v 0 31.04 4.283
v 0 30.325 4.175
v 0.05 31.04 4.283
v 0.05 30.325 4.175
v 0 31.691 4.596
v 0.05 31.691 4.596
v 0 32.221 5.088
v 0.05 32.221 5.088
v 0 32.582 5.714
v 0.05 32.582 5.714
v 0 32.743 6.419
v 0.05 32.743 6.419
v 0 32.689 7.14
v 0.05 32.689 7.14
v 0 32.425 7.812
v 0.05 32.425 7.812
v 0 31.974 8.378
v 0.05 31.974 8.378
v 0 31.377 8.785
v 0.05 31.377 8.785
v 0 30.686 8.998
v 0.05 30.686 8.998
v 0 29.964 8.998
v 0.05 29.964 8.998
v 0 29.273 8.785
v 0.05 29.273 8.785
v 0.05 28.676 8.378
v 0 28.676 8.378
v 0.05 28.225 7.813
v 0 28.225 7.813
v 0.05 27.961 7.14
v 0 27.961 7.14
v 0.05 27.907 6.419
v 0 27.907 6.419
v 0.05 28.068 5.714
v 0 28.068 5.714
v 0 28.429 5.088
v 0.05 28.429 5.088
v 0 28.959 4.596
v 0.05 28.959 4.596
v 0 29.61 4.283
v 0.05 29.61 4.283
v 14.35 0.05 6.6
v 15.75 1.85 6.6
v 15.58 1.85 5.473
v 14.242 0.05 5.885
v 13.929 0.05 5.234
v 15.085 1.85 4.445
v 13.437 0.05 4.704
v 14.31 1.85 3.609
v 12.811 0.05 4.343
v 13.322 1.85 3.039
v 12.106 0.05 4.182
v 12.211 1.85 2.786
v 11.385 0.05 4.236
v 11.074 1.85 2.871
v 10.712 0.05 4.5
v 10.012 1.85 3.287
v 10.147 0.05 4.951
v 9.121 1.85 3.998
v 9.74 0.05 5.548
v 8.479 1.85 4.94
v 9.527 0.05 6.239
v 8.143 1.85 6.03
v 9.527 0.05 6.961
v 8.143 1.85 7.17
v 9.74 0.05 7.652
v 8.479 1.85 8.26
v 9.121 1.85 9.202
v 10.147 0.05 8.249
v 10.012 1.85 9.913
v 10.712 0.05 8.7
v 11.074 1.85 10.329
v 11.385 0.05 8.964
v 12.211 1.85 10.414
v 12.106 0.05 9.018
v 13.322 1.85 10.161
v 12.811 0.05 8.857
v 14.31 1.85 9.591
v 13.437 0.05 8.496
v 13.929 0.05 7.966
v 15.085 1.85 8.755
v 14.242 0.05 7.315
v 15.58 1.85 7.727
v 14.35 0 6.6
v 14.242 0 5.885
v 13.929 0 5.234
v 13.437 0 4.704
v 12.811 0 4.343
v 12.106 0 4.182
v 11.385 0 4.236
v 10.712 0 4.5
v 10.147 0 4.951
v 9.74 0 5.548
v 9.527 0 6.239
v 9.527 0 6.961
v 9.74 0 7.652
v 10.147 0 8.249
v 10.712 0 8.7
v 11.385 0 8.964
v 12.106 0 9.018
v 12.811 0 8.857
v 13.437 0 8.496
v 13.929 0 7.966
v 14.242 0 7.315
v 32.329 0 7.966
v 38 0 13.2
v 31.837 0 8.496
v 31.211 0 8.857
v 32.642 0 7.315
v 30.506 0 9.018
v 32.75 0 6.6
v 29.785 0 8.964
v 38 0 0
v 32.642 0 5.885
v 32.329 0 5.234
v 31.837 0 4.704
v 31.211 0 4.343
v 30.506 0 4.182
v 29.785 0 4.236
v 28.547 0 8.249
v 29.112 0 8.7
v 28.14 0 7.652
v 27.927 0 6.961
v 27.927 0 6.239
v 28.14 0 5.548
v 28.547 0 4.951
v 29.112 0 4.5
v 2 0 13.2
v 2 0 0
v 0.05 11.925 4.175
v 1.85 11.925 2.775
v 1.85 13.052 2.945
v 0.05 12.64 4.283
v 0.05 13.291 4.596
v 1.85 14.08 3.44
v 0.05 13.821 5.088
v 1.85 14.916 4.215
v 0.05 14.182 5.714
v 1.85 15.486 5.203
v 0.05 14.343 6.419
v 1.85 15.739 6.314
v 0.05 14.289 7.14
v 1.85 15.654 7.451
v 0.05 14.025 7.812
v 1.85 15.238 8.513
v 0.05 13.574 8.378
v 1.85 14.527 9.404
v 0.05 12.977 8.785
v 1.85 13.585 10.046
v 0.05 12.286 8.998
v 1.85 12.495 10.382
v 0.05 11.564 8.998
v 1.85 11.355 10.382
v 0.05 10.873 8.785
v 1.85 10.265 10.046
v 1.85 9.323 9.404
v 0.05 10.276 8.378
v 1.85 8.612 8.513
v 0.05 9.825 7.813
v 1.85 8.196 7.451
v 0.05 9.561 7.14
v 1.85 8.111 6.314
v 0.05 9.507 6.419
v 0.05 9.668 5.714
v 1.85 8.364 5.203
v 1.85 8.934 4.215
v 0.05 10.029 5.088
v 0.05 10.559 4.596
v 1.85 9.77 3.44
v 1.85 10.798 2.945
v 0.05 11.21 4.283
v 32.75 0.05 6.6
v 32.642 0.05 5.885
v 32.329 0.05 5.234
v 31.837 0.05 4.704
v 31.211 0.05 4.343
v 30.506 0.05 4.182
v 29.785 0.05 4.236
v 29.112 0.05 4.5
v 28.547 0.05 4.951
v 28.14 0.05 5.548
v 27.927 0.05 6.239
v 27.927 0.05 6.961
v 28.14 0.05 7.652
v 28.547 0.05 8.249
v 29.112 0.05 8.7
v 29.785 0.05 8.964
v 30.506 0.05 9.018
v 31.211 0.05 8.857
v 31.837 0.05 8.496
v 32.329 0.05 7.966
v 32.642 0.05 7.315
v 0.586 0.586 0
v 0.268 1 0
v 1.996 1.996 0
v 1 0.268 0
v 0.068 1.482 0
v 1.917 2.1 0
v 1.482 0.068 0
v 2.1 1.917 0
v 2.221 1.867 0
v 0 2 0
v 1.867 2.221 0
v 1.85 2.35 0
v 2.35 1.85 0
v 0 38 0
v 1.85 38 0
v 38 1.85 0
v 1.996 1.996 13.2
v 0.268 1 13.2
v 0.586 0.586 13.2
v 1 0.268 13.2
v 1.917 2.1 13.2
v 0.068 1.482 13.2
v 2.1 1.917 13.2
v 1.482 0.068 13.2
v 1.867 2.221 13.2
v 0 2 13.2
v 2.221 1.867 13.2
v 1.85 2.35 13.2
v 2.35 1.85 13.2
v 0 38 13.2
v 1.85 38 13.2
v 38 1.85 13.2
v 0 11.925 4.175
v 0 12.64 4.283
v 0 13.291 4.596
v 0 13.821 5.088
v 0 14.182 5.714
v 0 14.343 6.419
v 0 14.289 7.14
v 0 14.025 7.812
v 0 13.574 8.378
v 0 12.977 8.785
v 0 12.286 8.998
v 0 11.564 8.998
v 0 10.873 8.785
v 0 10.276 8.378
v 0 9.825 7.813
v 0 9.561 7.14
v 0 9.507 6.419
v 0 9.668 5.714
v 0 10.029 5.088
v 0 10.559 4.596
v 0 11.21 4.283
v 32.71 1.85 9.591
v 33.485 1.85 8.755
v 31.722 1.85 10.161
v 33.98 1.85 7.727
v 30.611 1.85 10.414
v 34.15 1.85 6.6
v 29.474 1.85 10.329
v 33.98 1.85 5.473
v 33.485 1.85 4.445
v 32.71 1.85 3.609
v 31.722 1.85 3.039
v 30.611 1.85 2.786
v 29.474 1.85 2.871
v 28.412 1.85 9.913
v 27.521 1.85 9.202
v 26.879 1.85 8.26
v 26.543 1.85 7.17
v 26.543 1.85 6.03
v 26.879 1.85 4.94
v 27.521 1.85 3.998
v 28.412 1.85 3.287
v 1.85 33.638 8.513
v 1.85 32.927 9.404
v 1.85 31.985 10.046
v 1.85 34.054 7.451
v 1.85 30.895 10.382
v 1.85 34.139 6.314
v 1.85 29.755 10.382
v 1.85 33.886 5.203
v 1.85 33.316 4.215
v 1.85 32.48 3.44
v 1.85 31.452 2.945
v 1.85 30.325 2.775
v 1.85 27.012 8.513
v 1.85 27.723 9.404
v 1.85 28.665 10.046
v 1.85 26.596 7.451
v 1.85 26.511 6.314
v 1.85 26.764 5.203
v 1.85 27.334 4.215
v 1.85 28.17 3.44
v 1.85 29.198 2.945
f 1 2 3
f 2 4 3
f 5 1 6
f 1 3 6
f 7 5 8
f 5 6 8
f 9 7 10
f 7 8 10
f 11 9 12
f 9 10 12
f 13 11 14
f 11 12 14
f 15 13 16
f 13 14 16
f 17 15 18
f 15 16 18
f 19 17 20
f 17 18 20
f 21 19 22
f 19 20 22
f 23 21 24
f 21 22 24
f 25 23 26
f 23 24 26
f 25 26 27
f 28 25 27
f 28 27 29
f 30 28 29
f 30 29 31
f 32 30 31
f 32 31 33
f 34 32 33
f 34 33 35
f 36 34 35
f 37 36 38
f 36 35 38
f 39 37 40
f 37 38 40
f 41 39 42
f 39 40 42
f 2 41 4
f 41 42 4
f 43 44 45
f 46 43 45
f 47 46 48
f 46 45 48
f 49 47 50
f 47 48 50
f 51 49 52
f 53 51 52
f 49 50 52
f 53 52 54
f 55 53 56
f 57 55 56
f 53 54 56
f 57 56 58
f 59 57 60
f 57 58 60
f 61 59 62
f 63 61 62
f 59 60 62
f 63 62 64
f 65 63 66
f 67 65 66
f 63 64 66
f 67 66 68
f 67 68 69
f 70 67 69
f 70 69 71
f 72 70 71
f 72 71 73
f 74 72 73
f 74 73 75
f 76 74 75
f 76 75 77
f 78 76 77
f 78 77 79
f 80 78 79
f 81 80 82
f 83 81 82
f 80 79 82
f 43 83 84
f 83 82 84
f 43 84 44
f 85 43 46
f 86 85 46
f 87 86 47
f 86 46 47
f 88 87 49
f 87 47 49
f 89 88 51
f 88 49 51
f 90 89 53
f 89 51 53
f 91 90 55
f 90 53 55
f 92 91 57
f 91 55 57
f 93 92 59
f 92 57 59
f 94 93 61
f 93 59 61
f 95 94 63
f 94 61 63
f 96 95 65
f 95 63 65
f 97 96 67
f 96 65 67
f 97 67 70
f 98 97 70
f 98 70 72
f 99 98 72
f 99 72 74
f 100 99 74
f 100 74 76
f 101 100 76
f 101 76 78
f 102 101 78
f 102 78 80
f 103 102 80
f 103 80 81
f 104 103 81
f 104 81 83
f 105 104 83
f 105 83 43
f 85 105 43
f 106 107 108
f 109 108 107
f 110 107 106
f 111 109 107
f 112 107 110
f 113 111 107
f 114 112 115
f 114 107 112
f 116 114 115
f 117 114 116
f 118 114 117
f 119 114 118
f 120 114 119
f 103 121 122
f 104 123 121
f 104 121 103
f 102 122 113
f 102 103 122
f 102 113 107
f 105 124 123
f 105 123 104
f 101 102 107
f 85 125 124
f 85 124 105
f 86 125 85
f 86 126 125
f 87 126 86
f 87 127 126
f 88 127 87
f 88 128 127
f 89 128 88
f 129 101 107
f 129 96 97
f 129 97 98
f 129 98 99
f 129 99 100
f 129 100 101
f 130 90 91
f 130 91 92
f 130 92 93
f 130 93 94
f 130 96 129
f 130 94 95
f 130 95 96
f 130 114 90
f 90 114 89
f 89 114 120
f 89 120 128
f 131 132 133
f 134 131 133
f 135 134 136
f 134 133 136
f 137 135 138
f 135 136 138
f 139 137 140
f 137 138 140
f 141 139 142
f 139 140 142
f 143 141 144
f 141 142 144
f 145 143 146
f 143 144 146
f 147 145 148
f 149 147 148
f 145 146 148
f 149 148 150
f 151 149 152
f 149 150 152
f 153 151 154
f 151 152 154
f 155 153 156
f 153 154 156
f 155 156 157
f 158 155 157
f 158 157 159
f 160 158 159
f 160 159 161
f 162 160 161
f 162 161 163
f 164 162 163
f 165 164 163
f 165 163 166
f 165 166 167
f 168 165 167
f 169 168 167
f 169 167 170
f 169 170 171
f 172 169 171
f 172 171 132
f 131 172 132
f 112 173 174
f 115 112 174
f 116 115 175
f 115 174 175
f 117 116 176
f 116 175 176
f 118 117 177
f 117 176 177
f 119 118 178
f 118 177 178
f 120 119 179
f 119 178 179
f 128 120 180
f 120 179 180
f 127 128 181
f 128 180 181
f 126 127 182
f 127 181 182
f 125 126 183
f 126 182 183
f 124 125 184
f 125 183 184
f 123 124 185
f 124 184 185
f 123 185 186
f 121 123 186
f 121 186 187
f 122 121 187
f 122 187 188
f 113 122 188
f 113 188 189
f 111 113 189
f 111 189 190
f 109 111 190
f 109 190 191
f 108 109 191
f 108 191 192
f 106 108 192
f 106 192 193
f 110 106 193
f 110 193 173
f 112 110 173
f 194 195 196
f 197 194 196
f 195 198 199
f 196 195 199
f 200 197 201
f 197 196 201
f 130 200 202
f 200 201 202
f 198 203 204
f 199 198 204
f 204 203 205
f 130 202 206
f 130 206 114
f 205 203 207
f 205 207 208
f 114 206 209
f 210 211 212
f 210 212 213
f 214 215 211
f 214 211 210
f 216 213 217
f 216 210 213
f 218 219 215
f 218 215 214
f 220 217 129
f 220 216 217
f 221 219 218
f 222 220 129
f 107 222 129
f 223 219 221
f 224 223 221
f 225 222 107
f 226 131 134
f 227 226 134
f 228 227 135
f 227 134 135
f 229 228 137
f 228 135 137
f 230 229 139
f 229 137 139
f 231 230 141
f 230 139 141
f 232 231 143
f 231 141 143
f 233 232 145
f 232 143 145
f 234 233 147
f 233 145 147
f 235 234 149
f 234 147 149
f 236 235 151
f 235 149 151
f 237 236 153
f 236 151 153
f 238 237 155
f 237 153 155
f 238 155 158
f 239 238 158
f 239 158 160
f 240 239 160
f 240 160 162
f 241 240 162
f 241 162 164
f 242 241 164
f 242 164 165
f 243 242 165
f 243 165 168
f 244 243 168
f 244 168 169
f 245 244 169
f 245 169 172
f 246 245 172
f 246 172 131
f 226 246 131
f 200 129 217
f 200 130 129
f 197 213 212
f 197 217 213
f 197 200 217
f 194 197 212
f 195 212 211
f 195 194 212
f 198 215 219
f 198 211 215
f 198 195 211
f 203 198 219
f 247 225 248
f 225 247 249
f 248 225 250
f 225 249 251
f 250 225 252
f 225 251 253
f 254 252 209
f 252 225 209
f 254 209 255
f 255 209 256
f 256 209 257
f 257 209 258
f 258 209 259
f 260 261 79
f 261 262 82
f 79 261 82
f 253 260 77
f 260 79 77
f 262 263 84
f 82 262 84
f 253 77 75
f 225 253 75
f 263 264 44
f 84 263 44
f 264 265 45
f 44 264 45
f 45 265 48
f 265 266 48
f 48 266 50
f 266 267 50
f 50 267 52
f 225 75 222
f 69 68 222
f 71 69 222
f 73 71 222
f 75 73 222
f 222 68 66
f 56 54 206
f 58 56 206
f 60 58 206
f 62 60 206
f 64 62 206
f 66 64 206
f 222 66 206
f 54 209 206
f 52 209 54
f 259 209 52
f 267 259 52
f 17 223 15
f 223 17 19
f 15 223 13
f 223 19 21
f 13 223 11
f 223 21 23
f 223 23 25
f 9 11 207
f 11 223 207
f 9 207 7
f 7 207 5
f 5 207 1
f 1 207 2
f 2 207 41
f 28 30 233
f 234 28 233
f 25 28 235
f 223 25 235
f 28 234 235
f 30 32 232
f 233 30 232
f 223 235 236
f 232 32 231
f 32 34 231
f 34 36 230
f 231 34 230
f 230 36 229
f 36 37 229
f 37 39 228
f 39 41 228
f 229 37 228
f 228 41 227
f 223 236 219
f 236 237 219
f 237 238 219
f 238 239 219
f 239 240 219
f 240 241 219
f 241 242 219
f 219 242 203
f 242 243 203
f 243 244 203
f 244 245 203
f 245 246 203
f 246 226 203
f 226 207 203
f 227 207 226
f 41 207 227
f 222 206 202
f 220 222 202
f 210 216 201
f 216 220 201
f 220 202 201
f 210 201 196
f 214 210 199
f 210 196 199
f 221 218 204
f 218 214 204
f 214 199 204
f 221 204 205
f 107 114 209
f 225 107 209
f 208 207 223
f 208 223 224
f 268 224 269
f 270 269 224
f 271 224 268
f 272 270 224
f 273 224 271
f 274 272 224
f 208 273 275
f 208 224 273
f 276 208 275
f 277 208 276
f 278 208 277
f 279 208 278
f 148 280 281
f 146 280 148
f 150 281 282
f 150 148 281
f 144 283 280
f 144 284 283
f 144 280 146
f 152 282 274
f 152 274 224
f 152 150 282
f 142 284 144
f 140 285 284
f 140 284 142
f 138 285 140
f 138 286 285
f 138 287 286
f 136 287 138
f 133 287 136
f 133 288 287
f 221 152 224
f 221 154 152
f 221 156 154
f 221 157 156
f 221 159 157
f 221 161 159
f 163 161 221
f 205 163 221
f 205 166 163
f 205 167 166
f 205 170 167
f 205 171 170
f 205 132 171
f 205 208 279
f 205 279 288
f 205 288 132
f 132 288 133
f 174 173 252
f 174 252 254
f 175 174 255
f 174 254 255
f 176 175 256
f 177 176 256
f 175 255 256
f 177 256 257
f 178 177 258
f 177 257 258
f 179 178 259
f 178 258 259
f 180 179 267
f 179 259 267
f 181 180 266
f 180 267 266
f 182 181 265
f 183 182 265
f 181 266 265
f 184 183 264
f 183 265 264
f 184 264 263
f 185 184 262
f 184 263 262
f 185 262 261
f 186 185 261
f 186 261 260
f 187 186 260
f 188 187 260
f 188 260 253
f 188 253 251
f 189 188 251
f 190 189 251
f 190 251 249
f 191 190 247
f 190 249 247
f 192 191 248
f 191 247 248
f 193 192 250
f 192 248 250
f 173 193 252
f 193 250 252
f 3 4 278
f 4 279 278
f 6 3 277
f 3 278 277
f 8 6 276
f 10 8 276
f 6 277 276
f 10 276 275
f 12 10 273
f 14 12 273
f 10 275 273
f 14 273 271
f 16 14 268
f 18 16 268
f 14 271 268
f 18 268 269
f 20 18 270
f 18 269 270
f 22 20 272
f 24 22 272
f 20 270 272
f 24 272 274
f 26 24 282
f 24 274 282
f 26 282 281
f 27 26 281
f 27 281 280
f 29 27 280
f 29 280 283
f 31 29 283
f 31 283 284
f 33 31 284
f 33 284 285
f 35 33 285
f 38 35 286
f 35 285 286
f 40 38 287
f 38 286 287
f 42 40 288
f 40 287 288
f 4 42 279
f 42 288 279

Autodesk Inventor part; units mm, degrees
ref_plane "YZ Plane" through (0, 0, 0) normal (1, 0, 0) x (0, 1, 0)
ref_plane "XZ Plane" through (0, 0, 0) normal (0, 1, 0) x (-1, 0, 0)
ref_plane "XY Plane" through (0, 0, 0) normal (0, 0, 1) x (1, 0, 0)
sketch "Sketch1" plane through (0, 0, 0) normal (0, 0, 1) x (1, 0, 0)
  line L0 (0, 38) -> (1.85, 38)
  line L1 (1.85, 38) -> (1.85, 2.35)
  line L2 (0, 38) -> (0, 2)
  line L3 (38, 0) -> (38, 1.85)
  line L4 (38, 1.85) -> (2.35, 1.85)
  line L5 (38, 0) -> (2, 0)
  arc A0 (1.85, 2.35) -> (2.35, 1.85) centre (2.35, 2.35) ccw
  arc A1 (0, 2) -> (2, 0) centre (2, 2) ccw
  point P0 (0, 0)
  dimension "d0" = 1.85
  dimension "d1" = 1.85
  dimension "d2" = 38
  dimension "d3" = 38
  dimension "d4" = 0.5
  dimension "d5" = 2
extrude "Extrusion1" add sketch "Sketch1" along normal blind 13.2
sketch "Sketch2" plane through (1.85, 2.35, 0) normal (1, 0, 0) x (0, 0, -1)
  circle A0 centre (-6.6, 27.975) radius 2.425
  circle A1 centre (-6.6, 9.575) radius 2.425
  line L0 (0, 35.65) -> (-13.2, 35.65) projected
  line L1 (-13.2, 0) -> (-13.2, 35.65) projected
  point P0 (0, -2.35)
  dimension "d8" = 18.4
  dimension "d9" = 4.85
  dimension "d10" = 4.85
  dimension "d11" = 5.25
  dimension "d12" = 13.2
  dimension "d13" = 6.6
  dimension "d14" = 6.6
sketch "Sketch3" plane through (2.35, 1.85, 0) normal (0, 1, 0) x (1, 0, 0)
  circle A0 centre (27.975, -6.6) radius 2.425
  circle A1 centre (9.575, -6.6) radius 2.425
  line L0 (35.65, -13.2) -> (0, -13.2) projected
  line L1 (35.65, 0) -> (35.65, -13.2) projected
  point P0 (-2.35, 0)
  dimension "d15" = 18.4
  dimension "d16" = 6.6
  dimension "d17" = 6.6
  dimension "d18" = 4.85
  dimension "d19" = 4.85
  dimension "d20" = 5.25
extrude "Extrusion2" cut sketch "Sketch2" against normal blind 13.2
extrude "Extrusion3" cut sketch "Sketch3" against normal blind 13.2
chamfer "Chamfer1" distance 1.4 distance2 1.8 1 edges at (1.85, 30.325, 9.025) measured on face at (1.85, 23.3649, 1.4152)
chamfer "Chamfer2" distance 1.4 distance2 1.8 1 edges at (9.5, 1.85, 6.6) measured on face at (17.5224, 1.85, 1.3976)
chamfer "Chamfer3" distance 1.4 distance2 1.8 1 edges at (1.85, 11.925, 9.025) measured on face at (1.85, 23.2532, 12.238)
chamfer "Chamfer4" distance 1.4 distance2 1.8 1 edges at (27.9, 1.85, 6.6) measured on face at (17.5787, 1.85, 0.9343)
equation "\"d13\" = 0.5 * d12"
equation "\"d14\" = d13"
equation "\"d17\" = d16"
properties part number "L-Bracket"
